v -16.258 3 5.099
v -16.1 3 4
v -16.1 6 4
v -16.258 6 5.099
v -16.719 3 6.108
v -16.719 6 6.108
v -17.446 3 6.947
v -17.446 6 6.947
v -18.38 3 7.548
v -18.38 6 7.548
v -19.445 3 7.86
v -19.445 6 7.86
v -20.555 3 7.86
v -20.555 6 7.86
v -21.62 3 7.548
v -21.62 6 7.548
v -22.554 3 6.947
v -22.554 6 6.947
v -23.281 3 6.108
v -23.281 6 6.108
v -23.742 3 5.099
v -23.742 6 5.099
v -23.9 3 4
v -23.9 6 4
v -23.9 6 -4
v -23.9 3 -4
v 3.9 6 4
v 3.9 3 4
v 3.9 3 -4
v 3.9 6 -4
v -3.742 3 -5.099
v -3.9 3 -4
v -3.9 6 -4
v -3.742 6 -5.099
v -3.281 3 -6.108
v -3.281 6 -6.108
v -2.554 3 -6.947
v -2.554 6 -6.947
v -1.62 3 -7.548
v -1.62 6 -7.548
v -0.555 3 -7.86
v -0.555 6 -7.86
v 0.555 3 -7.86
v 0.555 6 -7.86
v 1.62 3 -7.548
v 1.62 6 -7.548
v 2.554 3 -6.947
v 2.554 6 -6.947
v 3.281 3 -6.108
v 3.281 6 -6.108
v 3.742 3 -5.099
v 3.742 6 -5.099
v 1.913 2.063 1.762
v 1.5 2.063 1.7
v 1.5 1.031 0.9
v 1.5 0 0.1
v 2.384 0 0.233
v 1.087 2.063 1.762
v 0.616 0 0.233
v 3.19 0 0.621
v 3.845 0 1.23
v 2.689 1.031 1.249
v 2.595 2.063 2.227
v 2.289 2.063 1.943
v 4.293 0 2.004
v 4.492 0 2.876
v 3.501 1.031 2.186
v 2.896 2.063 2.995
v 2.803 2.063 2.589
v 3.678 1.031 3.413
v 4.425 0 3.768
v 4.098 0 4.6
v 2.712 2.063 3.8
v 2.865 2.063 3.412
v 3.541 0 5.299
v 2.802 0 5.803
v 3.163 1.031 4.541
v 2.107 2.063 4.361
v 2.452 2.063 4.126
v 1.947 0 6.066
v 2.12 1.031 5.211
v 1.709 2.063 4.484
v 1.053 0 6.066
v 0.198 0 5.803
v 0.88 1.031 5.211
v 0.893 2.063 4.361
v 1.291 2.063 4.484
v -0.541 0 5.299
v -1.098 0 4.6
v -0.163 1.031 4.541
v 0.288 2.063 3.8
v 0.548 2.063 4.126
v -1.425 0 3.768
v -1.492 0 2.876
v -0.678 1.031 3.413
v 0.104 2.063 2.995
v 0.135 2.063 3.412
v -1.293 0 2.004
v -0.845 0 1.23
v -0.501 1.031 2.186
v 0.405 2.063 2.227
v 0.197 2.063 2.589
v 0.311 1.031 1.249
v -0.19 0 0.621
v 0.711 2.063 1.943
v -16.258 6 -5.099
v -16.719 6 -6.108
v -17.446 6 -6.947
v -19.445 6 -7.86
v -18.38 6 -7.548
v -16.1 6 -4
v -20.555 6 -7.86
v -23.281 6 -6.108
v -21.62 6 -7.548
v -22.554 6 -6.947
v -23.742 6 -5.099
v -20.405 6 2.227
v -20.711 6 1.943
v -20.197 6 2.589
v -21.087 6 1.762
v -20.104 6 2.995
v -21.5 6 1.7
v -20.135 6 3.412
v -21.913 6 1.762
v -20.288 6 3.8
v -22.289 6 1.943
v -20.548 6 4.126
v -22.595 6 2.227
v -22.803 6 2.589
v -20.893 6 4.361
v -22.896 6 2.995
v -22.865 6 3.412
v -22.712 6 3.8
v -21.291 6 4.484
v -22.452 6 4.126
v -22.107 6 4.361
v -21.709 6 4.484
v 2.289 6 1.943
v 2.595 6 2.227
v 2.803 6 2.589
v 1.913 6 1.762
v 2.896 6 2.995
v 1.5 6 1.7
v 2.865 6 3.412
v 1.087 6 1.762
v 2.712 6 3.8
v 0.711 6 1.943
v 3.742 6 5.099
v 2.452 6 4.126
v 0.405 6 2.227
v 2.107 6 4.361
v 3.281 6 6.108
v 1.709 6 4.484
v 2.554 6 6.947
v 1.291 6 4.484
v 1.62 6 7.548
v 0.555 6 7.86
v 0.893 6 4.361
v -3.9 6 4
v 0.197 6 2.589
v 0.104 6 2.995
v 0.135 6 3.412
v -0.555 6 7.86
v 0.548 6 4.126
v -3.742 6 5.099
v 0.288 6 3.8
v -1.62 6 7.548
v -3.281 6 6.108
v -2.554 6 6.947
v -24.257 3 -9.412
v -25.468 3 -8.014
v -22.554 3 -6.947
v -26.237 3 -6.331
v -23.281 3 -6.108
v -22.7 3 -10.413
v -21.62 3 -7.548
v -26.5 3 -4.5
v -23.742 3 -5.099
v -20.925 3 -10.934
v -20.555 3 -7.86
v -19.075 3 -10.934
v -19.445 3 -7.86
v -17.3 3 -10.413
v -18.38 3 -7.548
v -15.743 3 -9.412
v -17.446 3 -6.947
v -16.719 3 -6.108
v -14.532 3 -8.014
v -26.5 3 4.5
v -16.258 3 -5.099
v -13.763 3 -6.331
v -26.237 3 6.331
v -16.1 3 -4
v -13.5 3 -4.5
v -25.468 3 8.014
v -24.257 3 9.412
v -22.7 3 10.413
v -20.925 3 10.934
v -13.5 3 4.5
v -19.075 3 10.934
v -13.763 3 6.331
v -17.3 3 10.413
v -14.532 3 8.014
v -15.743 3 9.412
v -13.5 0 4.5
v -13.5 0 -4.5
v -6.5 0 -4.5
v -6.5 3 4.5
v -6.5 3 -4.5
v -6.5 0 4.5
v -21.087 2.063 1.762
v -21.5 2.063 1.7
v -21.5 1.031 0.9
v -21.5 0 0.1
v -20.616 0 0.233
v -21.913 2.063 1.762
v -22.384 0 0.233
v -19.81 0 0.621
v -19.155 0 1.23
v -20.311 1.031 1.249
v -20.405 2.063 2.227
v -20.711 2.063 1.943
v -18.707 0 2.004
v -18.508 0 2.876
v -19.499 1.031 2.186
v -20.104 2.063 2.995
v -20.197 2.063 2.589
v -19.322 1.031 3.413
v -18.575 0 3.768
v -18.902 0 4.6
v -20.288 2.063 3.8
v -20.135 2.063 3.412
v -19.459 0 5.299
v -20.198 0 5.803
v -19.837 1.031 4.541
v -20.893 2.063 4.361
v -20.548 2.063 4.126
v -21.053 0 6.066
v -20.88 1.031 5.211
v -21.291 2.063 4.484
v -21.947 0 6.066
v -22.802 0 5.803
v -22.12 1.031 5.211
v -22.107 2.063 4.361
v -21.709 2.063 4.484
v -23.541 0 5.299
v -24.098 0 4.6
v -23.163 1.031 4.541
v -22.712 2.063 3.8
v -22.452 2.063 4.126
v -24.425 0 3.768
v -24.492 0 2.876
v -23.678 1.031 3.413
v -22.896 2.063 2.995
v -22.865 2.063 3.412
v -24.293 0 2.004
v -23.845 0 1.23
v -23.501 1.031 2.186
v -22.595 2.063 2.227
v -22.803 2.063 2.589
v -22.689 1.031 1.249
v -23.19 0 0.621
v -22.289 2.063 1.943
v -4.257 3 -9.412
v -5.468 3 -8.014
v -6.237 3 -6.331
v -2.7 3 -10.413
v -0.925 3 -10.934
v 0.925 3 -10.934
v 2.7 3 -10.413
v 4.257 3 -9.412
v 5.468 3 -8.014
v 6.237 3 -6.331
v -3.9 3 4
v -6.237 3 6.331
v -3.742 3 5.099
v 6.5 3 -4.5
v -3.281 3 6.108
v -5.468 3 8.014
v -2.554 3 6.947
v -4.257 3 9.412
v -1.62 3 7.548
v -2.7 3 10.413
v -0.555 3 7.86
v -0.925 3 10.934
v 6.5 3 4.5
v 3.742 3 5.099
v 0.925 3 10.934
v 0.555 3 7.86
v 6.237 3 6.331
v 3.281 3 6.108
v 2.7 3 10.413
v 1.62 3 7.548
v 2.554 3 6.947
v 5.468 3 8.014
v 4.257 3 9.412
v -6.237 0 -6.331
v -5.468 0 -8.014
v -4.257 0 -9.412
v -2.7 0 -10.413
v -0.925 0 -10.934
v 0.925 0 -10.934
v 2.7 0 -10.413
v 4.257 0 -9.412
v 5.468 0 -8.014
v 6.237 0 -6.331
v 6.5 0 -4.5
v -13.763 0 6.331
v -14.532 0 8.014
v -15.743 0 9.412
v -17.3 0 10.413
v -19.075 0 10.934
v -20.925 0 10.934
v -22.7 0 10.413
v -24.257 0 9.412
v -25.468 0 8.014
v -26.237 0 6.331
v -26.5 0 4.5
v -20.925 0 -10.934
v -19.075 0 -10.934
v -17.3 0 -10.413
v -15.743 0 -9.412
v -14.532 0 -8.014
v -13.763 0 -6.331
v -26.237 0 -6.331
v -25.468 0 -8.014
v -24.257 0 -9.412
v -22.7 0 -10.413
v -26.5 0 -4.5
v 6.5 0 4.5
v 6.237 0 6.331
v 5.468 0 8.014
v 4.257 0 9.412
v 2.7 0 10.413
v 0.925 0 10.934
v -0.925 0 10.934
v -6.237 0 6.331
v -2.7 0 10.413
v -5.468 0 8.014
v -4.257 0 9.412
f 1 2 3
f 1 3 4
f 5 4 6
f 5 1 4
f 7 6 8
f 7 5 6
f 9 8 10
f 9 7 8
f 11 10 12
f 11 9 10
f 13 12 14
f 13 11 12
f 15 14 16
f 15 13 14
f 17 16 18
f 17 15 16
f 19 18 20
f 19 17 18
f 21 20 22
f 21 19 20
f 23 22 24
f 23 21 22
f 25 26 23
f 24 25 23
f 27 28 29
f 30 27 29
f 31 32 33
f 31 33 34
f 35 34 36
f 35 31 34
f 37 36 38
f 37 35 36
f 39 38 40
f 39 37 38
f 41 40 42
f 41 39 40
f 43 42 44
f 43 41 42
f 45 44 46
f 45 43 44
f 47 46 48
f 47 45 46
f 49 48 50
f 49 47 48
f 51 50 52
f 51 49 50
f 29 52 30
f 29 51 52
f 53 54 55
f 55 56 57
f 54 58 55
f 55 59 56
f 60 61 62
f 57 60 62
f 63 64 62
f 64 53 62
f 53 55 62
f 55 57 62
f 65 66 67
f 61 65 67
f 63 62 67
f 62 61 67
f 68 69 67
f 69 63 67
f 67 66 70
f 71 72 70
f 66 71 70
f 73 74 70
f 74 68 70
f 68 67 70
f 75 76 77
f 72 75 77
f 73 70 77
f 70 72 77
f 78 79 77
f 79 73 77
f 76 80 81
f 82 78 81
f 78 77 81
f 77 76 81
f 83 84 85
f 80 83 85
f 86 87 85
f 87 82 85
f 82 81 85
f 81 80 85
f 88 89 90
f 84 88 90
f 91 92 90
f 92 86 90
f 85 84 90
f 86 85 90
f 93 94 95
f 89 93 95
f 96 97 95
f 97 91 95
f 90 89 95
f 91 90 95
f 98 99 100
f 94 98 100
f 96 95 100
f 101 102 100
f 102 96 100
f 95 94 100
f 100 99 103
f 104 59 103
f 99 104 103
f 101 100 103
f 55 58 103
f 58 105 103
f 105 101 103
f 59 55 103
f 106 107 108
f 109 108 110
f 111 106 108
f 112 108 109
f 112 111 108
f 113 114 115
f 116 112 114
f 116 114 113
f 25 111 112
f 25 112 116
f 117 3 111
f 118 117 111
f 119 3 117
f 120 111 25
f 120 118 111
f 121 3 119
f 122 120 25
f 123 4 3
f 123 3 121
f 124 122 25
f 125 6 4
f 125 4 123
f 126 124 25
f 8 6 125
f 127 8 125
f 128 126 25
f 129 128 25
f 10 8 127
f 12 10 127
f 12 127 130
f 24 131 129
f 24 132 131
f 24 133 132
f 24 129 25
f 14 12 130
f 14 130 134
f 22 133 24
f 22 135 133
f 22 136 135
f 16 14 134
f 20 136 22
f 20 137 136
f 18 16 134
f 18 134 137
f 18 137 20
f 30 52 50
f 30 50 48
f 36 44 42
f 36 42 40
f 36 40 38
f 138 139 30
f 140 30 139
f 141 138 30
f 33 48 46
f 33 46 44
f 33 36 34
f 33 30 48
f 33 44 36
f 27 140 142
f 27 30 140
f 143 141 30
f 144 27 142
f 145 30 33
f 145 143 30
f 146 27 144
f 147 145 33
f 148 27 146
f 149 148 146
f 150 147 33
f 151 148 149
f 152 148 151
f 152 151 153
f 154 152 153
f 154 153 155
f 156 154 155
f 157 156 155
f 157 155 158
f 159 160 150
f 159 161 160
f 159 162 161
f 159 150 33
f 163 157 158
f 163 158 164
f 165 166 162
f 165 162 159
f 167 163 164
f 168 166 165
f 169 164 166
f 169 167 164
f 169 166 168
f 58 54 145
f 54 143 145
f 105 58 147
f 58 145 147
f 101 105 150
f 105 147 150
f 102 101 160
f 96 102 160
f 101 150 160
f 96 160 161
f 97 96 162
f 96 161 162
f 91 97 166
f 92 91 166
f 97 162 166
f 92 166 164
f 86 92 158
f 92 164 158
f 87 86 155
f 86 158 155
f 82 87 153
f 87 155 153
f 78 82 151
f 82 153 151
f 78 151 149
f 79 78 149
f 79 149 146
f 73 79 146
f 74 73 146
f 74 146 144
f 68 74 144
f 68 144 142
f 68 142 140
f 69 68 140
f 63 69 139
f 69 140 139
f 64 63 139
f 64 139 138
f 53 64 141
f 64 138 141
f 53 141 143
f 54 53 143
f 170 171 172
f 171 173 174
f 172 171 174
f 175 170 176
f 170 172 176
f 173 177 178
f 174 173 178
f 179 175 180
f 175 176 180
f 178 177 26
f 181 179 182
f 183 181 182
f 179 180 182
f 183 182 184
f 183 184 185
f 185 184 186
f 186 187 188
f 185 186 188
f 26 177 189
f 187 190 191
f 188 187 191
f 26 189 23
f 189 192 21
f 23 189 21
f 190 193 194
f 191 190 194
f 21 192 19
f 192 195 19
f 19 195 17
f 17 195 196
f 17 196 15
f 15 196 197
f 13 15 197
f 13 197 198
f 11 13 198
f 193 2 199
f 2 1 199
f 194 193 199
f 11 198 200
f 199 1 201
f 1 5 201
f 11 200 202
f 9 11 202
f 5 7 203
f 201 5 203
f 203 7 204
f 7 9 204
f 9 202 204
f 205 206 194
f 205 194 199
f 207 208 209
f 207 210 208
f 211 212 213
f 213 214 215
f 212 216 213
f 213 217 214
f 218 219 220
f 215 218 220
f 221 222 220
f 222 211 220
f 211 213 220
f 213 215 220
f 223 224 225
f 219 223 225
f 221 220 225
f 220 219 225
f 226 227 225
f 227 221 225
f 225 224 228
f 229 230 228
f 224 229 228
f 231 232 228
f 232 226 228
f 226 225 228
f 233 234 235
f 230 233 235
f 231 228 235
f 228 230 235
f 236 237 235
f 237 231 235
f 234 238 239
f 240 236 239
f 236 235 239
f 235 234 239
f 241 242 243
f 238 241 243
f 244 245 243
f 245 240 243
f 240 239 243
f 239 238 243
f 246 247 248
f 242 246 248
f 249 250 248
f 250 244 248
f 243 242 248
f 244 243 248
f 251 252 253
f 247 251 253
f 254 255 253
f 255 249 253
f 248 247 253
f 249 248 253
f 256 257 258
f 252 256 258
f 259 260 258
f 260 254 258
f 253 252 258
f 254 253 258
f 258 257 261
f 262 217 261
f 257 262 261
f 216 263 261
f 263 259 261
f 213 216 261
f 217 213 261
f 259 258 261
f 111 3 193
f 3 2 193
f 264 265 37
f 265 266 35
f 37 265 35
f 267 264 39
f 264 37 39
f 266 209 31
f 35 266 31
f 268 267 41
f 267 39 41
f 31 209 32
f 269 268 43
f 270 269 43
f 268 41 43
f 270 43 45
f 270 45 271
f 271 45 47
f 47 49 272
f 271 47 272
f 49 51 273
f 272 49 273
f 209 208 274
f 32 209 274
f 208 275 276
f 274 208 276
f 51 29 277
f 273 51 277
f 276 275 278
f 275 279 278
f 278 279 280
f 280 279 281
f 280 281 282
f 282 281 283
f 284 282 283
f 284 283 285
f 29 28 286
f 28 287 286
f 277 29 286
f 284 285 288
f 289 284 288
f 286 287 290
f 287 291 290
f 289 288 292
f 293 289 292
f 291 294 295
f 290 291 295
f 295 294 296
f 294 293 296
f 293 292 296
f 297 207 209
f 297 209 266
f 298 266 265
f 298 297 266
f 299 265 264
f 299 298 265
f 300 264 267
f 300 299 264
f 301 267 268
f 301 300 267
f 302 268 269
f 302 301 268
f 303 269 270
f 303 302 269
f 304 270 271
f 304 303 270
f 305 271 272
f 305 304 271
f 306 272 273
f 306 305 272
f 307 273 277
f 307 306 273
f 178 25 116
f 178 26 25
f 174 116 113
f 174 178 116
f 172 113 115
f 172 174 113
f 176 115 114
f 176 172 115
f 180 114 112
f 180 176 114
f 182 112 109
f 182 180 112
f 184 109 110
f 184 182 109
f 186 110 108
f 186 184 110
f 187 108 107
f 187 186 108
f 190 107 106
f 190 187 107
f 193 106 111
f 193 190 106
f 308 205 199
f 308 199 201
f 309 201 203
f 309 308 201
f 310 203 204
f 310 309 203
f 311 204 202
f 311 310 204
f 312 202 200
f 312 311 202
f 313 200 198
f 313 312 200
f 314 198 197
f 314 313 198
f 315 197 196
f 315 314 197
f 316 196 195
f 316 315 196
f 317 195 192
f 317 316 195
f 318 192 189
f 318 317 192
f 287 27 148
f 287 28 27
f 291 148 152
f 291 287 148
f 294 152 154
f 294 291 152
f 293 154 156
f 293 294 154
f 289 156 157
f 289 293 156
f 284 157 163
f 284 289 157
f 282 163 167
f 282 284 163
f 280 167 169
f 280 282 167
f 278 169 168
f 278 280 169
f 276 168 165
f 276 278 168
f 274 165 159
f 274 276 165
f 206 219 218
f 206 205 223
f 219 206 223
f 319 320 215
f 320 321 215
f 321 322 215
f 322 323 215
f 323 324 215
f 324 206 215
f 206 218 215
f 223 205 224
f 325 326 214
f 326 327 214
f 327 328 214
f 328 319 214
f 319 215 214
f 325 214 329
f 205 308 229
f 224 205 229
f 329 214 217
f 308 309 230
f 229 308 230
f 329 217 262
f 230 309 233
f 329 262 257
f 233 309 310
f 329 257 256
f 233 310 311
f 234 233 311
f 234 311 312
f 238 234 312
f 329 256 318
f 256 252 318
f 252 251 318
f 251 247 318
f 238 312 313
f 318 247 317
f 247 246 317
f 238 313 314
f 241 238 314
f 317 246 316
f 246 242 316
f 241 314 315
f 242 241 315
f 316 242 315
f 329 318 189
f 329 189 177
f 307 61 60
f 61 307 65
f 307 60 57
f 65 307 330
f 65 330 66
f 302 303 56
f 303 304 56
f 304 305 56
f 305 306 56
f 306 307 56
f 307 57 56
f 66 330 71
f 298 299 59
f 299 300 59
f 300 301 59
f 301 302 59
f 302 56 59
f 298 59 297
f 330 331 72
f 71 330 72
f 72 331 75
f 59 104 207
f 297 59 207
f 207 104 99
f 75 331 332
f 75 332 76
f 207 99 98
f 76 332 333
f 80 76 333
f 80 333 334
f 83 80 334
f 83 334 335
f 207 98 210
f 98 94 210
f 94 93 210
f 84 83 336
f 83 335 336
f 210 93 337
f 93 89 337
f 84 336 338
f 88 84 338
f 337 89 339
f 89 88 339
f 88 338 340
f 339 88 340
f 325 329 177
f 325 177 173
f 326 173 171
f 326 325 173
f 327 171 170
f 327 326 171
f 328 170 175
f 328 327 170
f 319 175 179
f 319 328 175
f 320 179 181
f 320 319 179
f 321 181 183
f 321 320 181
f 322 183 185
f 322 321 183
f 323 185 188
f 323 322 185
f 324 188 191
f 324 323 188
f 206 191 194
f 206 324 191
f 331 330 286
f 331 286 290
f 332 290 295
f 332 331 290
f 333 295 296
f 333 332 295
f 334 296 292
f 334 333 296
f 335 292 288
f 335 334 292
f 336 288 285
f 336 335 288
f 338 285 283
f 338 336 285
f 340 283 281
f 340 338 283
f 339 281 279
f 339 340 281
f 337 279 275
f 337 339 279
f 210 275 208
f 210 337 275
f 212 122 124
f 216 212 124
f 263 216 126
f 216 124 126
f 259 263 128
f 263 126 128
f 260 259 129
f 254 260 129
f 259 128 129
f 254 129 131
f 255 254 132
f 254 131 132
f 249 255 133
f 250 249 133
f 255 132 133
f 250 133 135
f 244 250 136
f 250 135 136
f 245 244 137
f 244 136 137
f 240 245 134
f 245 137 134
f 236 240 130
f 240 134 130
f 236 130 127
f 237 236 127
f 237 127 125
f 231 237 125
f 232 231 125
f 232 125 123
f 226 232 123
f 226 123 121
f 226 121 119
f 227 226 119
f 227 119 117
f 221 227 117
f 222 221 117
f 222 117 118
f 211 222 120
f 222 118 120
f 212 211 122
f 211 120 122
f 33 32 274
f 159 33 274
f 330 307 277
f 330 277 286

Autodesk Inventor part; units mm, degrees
ref_plane "YZ Plane" through (0, 0, 0) normal (1, 0, 0) x (0, 1, 0)
ref_plane "XZ Plane" through (0, 0, 0) normal (0, 1, 0) x (-1, 0, 0)
ref_plane "XY Plane" through (0, 0, 0) normal (0, 0, 1) x (1, 0, 0)
sketch "Sketch1" plane through (0, 0, 0) normal (0, 1, 0) x (-1, 0, 0)
  line L0 (0, -7.9) -> (0, 7.9) construction
  line L1 (3.9, -4) -> (3.9, 4)
  line L2 (-3.9, 4) -> (-3.9, -4)
  arc A0 (-3.9, -4) -> (3.9, -4) centre (0, -4) ccw
  arc A1 (3.9, 4) -> (-3.9, 4) centre (0, 4) ccw
  line L3 (0, -11) -> (0, 11) construction
  line L4 (20, -7.9) -> (20, 7.9) construction
  line L5 (23.9, -4) -> (23.9, 4)
  line L6 (16.1, 4) -> (16.1, -4)
  arc A2 (16.1, -4) -> (23.9, -4) centre (20, -4) ccw
  arc A3 (23.9, 4) -> (16.1, 4) centre (20, 4) ccw
  line L7 (20, -11) -> (20, 11) construction
  point P0 (0, 0)
  point P1 (0, 0)
  point P2 (0, 0)
  point P3 (20, 0)
  point P4 (20, 0)
  dimension "d0" = 15.8
  dimension "d1" = 7.8
  dimension "d2" = 3.9
  dimension "d29" = 15.8
  dimension "d30" = 7.8
  dimension "d32" = 20
  dimension "d43" = 4
  dimension "d44" = 20
  dimension "d45" = 22.8254
  dimension "d46" = 20
  dimension "d47" = 11
  dimension "d48" = 0
extrude "Extrusion1" add sketch "Sketch1" along normal blind 6
sketch "Sketch2" plane through (0, 0, 0) normal (0, -1, 0) x (1, 0, 0)
  line L0 (0, -11) -> (0, 11) construction
  line L1 (6.5, -4.5) -> (6.5, 4.5)
  line L2 (-6.5, 4.5) -> (-6.5, -4.5)
  arc A0 (-6.5, -4.5) -> (6.5, -4.5) centre (0, -4.5) ccw
  arc A1 (6.5, 4.5) -> (-6.5, 4.5) centre (0, 4.5) ccw
  line L3 (-20, -11) -> (-20, 11) construction
  line L4 (-13.5, -4.5) -> (-13.5, 4.5)
  line L5 (-26.5, 4.5) -> (-26.5, -4.5)
  arc A2 (-26.5, -4.5) -> (-13.5, -4.5) centre (-20, -4.5) ccw
  arc A3 (-13.5, 4.5) -> (-26.5, 4.5) centre (-20, 4.5) ccw
  point P0 (0, 0)
  point P1 (0, 0)
  point P2 (-20, 0)
  dimension "d9" = 22
  dimension "d10" = 13
  dimension "d33" = 22
  dimension "d34" = 13
  dimension "d35" = 20
extrude "Extrusion2" add sketch "Sketch2" against normal blind 3
sketch "Sketch3" plane through (0, 0, 0) normal (0, -1, 0) x (1, 0, 0)
  circle A0 centre (1.5, 3.1) radius 1.475
  circle A1 centre (-21.5, 3.1) radius 1.475
  point P0 (0, 0)
  point P1 (0, 3.1)
  dimension "d21" = 2.95
  dimension "d38" = 2.95
  dimension "d39" = 23
  dimension "d40" = 1.5
  dimension "d41" = 3.1
  dimension "d42" = 3.1
hole "Hole2" at (1.5, 0, 3.1) at (-21.5, 0, 3.1) direction (0, 1, 0) diameter 2.8 depth 8 tip angle 118 countersink diameter 6 countersink angle 75.6
properties part number "Enganche fuente"
